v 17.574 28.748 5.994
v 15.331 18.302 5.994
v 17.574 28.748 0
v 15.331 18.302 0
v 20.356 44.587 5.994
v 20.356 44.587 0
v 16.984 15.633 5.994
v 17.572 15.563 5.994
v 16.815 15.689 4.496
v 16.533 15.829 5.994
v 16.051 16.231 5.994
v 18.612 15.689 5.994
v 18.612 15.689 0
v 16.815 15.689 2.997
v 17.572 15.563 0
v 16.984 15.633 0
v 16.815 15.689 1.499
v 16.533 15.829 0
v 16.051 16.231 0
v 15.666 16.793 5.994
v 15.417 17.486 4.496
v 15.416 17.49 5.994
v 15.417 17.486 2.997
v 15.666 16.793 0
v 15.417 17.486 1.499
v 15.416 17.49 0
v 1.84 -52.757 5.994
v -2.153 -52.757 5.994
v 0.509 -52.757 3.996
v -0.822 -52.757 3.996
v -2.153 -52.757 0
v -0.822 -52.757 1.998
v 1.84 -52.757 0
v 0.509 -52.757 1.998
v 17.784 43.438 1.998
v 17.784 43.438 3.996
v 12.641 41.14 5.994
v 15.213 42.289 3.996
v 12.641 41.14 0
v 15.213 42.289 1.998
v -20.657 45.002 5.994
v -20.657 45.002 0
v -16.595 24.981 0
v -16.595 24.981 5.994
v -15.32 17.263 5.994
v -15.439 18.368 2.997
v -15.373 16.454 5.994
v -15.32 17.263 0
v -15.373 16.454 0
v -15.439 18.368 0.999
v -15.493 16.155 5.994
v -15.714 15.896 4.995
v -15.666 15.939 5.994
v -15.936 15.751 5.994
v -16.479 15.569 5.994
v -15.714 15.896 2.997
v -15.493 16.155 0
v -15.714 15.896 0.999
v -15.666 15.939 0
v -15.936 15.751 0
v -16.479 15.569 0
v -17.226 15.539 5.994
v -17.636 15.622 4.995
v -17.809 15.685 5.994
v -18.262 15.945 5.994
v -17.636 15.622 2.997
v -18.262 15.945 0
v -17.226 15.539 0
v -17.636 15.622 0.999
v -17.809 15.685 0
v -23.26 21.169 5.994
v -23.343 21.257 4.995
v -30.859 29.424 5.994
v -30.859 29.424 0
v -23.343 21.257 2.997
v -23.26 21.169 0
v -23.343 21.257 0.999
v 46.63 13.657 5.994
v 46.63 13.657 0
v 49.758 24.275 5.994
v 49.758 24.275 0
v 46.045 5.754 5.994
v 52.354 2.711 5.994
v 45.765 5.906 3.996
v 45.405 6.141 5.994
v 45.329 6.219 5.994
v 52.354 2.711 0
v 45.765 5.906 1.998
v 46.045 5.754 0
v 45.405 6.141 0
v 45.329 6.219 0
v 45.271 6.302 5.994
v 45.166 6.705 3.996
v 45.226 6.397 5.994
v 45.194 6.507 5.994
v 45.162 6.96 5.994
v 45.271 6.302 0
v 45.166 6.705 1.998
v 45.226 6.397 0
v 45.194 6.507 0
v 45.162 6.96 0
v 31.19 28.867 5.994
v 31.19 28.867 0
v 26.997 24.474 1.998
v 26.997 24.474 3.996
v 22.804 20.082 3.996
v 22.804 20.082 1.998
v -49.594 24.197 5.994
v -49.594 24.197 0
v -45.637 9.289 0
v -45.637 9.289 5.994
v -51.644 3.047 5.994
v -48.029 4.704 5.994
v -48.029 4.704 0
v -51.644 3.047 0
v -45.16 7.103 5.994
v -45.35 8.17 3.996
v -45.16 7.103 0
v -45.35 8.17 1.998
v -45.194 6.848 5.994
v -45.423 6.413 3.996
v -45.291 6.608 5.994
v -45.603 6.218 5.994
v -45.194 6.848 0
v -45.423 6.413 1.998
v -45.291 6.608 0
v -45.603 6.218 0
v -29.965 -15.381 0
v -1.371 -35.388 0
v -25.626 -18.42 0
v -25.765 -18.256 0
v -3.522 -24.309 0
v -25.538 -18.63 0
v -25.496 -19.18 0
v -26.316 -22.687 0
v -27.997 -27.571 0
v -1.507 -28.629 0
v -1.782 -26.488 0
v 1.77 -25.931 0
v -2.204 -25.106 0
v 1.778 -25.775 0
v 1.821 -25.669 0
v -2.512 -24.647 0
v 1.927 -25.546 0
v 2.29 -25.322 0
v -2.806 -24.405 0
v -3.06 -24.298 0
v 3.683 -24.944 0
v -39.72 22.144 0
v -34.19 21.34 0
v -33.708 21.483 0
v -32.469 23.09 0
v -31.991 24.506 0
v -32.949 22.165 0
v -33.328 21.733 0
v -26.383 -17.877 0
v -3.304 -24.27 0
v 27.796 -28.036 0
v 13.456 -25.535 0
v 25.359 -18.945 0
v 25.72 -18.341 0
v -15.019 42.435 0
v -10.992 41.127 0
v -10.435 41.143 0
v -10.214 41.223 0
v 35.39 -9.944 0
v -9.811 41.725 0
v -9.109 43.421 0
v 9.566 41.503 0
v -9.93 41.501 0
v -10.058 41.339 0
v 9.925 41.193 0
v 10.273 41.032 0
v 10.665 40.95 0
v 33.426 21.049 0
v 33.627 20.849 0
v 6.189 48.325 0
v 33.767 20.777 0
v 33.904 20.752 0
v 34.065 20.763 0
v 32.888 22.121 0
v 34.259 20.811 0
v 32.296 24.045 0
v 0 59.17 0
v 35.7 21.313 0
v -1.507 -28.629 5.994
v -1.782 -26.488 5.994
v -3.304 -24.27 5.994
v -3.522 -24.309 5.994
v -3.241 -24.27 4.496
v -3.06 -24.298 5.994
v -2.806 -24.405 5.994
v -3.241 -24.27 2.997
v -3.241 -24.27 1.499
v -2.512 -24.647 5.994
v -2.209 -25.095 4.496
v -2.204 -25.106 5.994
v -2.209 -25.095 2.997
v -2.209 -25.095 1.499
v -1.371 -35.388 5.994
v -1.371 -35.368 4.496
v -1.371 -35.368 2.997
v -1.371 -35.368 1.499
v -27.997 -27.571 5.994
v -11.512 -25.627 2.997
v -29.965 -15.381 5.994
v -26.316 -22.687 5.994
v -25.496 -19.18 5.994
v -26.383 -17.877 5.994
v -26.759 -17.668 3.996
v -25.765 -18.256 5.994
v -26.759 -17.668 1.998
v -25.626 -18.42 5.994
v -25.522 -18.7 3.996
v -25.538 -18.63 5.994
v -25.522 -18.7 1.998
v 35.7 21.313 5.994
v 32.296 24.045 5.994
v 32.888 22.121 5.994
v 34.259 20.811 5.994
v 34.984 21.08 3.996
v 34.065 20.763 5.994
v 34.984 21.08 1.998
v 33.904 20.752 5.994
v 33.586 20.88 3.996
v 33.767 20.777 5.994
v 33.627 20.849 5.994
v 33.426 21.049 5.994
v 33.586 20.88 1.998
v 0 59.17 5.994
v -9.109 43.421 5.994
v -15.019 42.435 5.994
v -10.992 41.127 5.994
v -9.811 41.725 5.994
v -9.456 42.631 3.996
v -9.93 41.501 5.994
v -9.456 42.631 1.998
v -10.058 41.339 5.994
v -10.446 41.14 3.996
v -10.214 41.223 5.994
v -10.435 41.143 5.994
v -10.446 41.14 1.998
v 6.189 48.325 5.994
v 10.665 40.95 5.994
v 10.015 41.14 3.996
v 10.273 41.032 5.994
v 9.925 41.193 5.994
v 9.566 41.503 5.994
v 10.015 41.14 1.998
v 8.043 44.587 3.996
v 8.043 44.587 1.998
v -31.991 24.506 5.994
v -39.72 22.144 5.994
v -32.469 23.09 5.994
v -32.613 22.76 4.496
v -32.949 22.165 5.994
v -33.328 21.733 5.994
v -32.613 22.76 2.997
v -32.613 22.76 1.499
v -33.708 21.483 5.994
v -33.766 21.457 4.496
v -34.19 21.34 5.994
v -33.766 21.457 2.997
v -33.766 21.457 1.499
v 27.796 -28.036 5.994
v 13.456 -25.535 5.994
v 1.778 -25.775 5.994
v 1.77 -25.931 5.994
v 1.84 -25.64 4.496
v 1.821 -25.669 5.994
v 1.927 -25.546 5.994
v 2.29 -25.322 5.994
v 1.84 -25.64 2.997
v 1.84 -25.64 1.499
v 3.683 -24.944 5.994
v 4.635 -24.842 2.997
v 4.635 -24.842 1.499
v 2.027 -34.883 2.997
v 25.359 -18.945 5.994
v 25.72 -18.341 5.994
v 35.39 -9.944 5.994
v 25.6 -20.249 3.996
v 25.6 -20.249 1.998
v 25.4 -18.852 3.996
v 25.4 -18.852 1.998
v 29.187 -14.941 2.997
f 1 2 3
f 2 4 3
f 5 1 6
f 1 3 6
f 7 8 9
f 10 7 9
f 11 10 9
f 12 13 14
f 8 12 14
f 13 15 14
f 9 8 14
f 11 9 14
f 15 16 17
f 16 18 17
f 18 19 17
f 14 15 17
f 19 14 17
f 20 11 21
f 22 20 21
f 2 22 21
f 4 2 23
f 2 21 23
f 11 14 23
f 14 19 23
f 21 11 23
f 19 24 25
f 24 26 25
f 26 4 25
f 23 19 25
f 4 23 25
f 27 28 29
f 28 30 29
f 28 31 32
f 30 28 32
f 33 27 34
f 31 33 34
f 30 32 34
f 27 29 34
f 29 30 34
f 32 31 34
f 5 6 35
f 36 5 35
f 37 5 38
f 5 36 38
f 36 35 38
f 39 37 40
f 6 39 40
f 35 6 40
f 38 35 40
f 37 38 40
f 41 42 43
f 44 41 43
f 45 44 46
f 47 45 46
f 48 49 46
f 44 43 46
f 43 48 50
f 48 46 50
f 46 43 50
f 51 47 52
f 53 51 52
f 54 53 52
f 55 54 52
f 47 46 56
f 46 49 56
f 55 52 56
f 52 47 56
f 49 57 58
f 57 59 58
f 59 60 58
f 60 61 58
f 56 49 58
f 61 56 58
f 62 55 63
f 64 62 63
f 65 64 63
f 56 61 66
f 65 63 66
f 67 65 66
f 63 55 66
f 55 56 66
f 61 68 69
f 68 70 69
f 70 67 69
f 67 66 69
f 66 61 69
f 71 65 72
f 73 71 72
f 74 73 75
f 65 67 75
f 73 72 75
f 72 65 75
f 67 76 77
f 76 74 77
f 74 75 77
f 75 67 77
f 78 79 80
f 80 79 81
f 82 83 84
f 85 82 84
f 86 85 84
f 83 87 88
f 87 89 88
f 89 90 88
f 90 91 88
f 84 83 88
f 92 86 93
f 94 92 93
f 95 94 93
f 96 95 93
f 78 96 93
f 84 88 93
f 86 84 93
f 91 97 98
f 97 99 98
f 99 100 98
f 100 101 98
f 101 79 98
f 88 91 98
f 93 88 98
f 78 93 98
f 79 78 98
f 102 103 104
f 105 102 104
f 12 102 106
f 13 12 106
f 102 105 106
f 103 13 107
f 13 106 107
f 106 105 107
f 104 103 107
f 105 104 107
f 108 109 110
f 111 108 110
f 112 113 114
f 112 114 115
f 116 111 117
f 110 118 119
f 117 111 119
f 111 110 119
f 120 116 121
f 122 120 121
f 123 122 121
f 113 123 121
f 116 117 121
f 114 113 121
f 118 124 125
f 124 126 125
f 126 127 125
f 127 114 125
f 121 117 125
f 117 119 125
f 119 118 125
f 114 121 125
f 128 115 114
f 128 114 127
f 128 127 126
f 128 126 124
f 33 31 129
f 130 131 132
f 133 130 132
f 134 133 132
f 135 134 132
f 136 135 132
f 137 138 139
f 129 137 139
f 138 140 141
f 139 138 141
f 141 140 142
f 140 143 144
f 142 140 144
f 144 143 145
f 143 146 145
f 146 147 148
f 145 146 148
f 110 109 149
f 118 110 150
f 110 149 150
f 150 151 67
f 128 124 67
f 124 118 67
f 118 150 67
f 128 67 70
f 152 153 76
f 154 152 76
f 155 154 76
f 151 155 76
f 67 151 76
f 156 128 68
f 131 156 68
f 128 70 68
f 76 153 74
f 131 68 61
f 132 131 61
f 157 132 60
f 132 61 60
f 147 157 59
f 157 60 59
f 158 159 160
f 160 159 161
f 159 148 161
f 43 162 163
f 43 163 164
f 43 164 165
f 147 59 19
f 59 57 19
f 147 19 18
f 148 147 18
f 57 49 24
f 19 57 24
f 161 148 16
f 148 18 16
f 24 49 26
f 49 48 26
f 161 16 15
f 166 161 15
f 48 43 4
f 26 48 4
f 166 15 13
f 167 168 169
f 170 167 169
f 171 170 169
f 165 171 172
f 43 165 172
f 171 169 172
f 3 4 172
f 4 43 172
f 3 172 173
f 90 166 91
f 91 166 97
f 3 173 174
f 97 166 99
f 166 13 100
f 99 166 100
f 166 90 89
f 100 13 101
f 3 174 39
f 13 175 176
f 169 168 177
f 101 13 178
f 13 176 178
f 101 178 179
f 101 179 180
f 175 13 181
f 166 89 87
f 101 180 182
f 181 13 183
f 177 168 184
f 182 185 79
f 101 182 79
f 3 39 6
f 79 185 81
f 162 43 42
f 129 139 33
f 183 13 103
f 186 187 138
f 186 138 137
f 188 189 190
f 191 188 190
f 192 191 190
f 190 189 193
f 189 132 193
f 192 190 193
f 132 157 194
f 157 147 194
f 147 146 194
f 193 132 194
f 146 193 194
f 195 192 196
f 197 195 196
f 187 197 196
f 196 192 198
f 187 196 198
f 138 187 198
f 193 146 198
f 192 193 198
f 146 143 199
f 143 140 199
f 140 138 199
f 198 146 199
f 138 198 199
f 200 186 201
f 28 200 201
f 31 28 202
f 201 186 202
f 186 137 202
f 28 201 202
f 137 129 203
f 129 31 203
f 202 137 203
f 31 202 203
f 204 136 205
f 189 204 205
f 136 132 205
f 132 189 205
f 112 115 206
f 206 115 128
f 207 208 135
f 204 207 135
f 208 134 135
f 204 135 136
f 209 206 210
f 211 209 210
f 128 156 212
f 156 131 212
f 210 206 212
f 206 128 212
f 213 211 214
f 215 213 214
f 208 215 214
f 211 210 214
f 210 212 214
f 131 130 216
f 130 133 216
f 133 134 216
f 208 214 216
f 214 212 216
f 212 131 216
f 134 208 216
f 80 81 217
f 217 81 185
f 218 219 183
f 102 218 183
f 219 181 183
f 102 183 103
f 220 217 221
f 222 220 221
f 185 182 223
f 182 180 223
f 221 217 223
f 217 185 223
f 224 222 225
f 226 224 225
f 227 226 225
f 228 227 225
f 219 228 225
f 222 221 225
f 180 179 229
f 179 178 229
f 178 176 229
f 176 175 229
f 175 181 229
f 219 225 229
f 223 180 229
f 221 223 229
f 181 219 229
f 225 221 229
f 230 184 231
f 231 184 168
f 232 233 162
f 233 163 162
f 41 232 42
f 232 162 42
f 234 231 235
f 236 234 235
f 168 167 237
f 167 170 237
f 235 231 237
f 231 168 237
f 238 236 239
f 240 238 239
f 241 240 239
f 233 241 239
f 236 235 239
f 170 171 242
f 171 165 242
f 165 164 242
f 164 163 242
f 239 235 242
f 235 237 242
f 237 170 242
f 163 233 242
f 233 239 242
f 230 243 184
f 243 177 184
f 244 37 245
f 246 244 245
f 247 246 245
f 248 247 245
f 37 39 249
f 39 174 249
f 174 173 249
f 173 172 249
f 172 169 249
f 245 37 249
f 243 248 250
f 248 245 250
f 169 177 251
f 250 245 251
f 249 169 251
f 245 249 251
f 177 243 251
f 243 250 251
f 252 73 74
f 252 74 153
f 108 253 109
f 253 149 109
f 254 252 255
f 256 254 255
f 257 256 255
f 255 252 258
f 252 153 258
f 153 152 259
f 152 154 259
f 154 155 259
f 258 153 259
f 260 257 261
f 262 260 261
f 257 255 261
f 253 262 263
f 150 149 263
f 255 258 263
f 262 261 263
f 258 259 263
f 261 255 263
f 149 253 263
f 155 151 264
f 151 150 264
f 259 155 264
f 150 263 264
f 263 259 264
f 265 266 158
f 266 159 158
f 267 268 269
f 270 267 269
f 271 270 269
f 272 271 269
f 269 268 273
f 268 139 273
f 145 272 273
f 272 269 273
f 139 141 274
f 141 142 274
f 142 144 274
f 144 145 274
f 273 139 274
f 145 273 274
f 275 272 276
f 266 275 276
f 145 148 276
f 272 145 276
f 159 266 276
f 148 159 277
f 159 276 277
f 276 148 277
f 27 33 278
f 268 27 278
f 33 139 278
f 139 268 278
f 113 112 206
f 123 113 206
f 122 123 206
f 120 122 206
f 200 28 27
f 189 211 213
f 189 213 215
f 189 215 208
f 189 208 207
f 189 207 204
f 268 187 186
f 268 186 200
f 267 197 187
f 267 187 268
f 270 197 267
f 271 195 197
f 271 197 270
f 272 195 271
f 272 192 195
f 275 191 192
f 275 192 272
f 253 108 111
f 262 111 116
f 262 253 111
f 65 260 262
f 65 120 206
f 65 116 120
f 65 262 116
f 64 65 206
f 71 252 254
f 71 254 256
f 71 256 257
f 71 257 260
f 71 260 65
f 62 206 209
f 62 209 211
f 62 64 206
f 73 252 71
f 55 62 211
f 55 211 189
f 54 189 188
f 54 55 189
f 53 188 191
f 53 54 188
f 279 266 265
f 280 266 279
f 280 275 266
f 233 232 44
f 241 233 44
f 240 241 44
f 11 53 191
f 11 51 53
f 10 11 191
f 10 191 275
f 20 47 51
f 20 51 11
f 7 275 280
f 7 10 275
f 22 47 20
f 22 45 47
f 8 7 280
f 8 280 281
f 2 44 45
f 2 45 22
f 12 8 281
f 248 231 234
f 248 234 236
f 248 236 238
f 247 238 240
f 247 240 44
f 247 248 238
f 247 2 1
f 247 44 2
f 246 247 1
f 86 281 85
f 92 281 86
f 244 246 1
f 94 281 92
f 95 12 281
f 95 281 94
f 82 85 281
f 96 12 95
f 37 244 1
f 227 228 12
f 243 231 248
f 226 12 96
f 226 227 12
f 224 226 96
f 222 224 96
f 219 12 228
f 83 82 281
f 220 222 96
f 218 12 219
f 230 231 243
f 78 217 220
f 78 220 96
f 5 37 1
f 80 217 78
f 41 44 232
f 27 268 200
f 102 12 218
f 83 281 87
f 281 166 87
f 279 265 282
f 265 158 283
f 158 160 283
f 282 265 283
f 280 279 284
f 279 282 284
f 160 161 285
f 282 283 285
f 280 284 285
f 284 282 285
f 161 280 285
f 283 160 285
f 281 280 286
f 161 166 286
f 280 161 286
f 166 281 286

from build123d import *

# Parameters (mm, degrees)
F1_DEPTH = 2.9972
F2_SCALE = 2


with BuildPart() as f1:
    # F0 (on Top) → F1 (new body)
    with BuildSketch(Plane.XY):
        with BuildLine():
            add(Edge.make_bspline(
                [(1.8626e-06, 29.5847542584), (-2.0757245538, 26.1642020619), (-4.7877317058, 21.6951342953), (-5.0290437881, 20.0090175634), (-8.1248154468, 21.4649471039), (-10.328296572, 22.5012358278)],
                knots=[0, 0, 0, 0, 0.484611334, 0.633161188, 1, 1, 1, 1], degree=3))
            add(Edge.make_bspline(
                [(-10.328296572, 22.5012358278), (-9.1778666198, 16.9476591934), (-7.6792276315, 9.7131409572), (-7.596567515, 7.8315049862), (-8.9609061532, 7.650136782), (-9.757905792, 8.6764269491), (-11.831216715, 10.7467415664), (-14.1048527383, 13.2521715422), (-15.4297286645, 14.712116681)],
                knots=[0, 0, 0, 0, 0.3377128003, 0.4399308001, 0.530257534, 0.6293768723, 0.7840333041, 1, 1, 1, 1], degree=3))
            add(Edge.make_bspline(
                [(-15.4297286645, 14.712116681), (-15.7019884236, 13.3987359492), (-16.1110319061, 11.42551071), (-16.860807344, 10.5984587671), (-18.2362244184, 10.7070895058), (-22.0615501586, 11.5183620077), (-24.7972309589, 12.0985433459)],
                knots=[0, 0, 0, 0, 0.2866887731, 0.4307216554, 0.5928807262, 1, 1, 1, 1], degree=3))
            add(Edge.make_bspline(
                [(-24.7972309589, 12.0985433459), (-23.902213957, 8.7474473723), (-22.7157611071, 4.3051659854), (-22.4206886908, 3.0239393122), (-24.4605719231, 2.1238949638), (-25.8218236268, 1.52327877)],
                knots=[0, 0, 0, 0, 0.505363113, 0.6699196824, 1, 1, 1, 1], degree=3))
            add(Edge.make_bspline(
                [(-25.8218236268, 1.52327877), (-20.4428695743, -3.1627061709), (-13.8639756954, -8.8940430338), (-12.3534902749, -9.1746569156), (-13.3183272743, -11.8786936329), (-13.9986192808, -13.7852691114)],
                knots=[0, 0, 0, 0, 0.5693389861, 0.6963474189, 1, 1, 1, 1], degree=3))
            add(Edge.make_bspline(
                [(-13.9986192808, -13.7852691114), (-8.6076761786, -13.1697388181), (-2.2045770639, -12.4386419764), (-1.6447685876, -12.0689795714), (-0.2980547426, -12.6424348407), (-0.7256226833, -20.1869895207), (-1.0765119223, -26.3785272837)],
                knots=[0, 0, 0, 0, 0.4012183012, 0.4765475169, 0.5704218535, 1, 1, 1, 1], degree=3))
            add(Edge.make_bspline(
                [(-1.0765119223, -26.3785272837), (-0.4109808166, -26.3785272837), (0.2545502891, -26.3785272837), (0.9200813947, -26.3785272837)],
                knots=[0, 0, 0, 0, 1.996593317, 1.996593317, 1.996593317, 1.996593317], degree=3))
            add(Edge.make_bspline(
                [(0.9200813947, -26.3785272837), (1.0015269498, -20.4473186418), (1.0971602655, -13.4828974618), (0.7876323235, -12.7456455053), (2.907767063, -11.9653574753), (9.2264825904, -13.1455394915), (13.8979414478, -14.0180541202)],
                knots=[0, 0, 0, 0, 0.4083173028, 0.4794459011, 0.6151516799, 1, 1, 1, 1], degree=3))
            add(Edge.make_bspline(
                [(13.8979414478, -14.0180541202), (13.4973481264, -12.4204432582), (12.929413615, -10.1554570593), (12.0459108132, -9.0324645661), (19.7603037154, -3.361382511), (26.1769928038, 1.355718472)],
                knots=[0, 0, 0, 0, 0.2870859093, 0.4070112678, 1, 1, 1, 1], degree=3))
            add(Edge.make_bspline(
                [(26.1769928038, 1.355718472), (24.7992453695, 2.0043980696), (22.9127836217, 2.8925936975), (22.2381650565, 3.3964414785), (23.6972477301, 8.2254705669), (24.8792078346, 12.1373254806)],
                knots=[0, 0, 0, 0, 0.3396656034, 0.4650824614, 1, 1, 1, 1], degree=3))
            add(Edge.make_bspline(
                [(24.8792078346, 12.1373254806), (21.7670543406, 11.5478502972), (17.7037999482, 10.7782264233), (16.5415099946, 10.0285074778), (15.987528041, 12.6067751859), (15.5950468034, 14.433408156)],
                knots=[0, 0, 0, 0, 0.4882090656, 0.6374099588, 1, 1, 1, 1], degree=3))
            add(Edge.make_bspline(
                [(15.5950468034, 14.433408156), (13.4986229241, 12.2371548787), (11.4021990448, 10.0409016013), (9.3057751656, 7.844648324)],
                knots=[0, 0, 0, 0, 9.1086054838, 9.1086054838, 9.1086054838, 9.1086054838], degree=3))
            add(Edge.make_bspline(
                [(9.3057751656, 7.844648324), (8.997284628, 7.7899566738), (8.3415726505, 7.6737068519), (7.3162920318, 8.8744401557), (8.578092077, 12.5649983396), (9.5571776717, 18.5190232492), (10.1778833196, 22.293664515)],
                knots=[0, 0, 0, 0, 0.1337946081, 0.2843870925, 0.5463267198, 1, 1, 1, 1], degree=3))
            add(Edge.make_bspline(
                [(10.1778833196, 22.293664515), (8.8921425243, 21.7191843937), (7.6064017291, 21.1447042723), (6.3206609339, 20.570224151)],
                knots=[0, 0, 0, 0, 4.2247380062, 4.2247380062, 4.2247380062, 4.2247380062], degree=3))
            add(Edge.make_bspline(
                [(6.3206609339, 20.570224151), (5.8327104987, 20.4796799372), (4.7447474126, 20.2777972146), (4.0239125331, 22.7234317156), (1.6171270669, 26.8273328027), (1.8626e-06, 29.5847542584)],
                knots=[0, 0, 0, 0, 0.2106218054, 0.4696148069, 1, 1, 1, 1], degree=3))
        make_face()
    extrude(amount=F1_DEPTH)


with BuildPart() as f1_1:
    # F2: moved
    add(f1.part.scale(F2_SCALE))


solid = f1_1.part
